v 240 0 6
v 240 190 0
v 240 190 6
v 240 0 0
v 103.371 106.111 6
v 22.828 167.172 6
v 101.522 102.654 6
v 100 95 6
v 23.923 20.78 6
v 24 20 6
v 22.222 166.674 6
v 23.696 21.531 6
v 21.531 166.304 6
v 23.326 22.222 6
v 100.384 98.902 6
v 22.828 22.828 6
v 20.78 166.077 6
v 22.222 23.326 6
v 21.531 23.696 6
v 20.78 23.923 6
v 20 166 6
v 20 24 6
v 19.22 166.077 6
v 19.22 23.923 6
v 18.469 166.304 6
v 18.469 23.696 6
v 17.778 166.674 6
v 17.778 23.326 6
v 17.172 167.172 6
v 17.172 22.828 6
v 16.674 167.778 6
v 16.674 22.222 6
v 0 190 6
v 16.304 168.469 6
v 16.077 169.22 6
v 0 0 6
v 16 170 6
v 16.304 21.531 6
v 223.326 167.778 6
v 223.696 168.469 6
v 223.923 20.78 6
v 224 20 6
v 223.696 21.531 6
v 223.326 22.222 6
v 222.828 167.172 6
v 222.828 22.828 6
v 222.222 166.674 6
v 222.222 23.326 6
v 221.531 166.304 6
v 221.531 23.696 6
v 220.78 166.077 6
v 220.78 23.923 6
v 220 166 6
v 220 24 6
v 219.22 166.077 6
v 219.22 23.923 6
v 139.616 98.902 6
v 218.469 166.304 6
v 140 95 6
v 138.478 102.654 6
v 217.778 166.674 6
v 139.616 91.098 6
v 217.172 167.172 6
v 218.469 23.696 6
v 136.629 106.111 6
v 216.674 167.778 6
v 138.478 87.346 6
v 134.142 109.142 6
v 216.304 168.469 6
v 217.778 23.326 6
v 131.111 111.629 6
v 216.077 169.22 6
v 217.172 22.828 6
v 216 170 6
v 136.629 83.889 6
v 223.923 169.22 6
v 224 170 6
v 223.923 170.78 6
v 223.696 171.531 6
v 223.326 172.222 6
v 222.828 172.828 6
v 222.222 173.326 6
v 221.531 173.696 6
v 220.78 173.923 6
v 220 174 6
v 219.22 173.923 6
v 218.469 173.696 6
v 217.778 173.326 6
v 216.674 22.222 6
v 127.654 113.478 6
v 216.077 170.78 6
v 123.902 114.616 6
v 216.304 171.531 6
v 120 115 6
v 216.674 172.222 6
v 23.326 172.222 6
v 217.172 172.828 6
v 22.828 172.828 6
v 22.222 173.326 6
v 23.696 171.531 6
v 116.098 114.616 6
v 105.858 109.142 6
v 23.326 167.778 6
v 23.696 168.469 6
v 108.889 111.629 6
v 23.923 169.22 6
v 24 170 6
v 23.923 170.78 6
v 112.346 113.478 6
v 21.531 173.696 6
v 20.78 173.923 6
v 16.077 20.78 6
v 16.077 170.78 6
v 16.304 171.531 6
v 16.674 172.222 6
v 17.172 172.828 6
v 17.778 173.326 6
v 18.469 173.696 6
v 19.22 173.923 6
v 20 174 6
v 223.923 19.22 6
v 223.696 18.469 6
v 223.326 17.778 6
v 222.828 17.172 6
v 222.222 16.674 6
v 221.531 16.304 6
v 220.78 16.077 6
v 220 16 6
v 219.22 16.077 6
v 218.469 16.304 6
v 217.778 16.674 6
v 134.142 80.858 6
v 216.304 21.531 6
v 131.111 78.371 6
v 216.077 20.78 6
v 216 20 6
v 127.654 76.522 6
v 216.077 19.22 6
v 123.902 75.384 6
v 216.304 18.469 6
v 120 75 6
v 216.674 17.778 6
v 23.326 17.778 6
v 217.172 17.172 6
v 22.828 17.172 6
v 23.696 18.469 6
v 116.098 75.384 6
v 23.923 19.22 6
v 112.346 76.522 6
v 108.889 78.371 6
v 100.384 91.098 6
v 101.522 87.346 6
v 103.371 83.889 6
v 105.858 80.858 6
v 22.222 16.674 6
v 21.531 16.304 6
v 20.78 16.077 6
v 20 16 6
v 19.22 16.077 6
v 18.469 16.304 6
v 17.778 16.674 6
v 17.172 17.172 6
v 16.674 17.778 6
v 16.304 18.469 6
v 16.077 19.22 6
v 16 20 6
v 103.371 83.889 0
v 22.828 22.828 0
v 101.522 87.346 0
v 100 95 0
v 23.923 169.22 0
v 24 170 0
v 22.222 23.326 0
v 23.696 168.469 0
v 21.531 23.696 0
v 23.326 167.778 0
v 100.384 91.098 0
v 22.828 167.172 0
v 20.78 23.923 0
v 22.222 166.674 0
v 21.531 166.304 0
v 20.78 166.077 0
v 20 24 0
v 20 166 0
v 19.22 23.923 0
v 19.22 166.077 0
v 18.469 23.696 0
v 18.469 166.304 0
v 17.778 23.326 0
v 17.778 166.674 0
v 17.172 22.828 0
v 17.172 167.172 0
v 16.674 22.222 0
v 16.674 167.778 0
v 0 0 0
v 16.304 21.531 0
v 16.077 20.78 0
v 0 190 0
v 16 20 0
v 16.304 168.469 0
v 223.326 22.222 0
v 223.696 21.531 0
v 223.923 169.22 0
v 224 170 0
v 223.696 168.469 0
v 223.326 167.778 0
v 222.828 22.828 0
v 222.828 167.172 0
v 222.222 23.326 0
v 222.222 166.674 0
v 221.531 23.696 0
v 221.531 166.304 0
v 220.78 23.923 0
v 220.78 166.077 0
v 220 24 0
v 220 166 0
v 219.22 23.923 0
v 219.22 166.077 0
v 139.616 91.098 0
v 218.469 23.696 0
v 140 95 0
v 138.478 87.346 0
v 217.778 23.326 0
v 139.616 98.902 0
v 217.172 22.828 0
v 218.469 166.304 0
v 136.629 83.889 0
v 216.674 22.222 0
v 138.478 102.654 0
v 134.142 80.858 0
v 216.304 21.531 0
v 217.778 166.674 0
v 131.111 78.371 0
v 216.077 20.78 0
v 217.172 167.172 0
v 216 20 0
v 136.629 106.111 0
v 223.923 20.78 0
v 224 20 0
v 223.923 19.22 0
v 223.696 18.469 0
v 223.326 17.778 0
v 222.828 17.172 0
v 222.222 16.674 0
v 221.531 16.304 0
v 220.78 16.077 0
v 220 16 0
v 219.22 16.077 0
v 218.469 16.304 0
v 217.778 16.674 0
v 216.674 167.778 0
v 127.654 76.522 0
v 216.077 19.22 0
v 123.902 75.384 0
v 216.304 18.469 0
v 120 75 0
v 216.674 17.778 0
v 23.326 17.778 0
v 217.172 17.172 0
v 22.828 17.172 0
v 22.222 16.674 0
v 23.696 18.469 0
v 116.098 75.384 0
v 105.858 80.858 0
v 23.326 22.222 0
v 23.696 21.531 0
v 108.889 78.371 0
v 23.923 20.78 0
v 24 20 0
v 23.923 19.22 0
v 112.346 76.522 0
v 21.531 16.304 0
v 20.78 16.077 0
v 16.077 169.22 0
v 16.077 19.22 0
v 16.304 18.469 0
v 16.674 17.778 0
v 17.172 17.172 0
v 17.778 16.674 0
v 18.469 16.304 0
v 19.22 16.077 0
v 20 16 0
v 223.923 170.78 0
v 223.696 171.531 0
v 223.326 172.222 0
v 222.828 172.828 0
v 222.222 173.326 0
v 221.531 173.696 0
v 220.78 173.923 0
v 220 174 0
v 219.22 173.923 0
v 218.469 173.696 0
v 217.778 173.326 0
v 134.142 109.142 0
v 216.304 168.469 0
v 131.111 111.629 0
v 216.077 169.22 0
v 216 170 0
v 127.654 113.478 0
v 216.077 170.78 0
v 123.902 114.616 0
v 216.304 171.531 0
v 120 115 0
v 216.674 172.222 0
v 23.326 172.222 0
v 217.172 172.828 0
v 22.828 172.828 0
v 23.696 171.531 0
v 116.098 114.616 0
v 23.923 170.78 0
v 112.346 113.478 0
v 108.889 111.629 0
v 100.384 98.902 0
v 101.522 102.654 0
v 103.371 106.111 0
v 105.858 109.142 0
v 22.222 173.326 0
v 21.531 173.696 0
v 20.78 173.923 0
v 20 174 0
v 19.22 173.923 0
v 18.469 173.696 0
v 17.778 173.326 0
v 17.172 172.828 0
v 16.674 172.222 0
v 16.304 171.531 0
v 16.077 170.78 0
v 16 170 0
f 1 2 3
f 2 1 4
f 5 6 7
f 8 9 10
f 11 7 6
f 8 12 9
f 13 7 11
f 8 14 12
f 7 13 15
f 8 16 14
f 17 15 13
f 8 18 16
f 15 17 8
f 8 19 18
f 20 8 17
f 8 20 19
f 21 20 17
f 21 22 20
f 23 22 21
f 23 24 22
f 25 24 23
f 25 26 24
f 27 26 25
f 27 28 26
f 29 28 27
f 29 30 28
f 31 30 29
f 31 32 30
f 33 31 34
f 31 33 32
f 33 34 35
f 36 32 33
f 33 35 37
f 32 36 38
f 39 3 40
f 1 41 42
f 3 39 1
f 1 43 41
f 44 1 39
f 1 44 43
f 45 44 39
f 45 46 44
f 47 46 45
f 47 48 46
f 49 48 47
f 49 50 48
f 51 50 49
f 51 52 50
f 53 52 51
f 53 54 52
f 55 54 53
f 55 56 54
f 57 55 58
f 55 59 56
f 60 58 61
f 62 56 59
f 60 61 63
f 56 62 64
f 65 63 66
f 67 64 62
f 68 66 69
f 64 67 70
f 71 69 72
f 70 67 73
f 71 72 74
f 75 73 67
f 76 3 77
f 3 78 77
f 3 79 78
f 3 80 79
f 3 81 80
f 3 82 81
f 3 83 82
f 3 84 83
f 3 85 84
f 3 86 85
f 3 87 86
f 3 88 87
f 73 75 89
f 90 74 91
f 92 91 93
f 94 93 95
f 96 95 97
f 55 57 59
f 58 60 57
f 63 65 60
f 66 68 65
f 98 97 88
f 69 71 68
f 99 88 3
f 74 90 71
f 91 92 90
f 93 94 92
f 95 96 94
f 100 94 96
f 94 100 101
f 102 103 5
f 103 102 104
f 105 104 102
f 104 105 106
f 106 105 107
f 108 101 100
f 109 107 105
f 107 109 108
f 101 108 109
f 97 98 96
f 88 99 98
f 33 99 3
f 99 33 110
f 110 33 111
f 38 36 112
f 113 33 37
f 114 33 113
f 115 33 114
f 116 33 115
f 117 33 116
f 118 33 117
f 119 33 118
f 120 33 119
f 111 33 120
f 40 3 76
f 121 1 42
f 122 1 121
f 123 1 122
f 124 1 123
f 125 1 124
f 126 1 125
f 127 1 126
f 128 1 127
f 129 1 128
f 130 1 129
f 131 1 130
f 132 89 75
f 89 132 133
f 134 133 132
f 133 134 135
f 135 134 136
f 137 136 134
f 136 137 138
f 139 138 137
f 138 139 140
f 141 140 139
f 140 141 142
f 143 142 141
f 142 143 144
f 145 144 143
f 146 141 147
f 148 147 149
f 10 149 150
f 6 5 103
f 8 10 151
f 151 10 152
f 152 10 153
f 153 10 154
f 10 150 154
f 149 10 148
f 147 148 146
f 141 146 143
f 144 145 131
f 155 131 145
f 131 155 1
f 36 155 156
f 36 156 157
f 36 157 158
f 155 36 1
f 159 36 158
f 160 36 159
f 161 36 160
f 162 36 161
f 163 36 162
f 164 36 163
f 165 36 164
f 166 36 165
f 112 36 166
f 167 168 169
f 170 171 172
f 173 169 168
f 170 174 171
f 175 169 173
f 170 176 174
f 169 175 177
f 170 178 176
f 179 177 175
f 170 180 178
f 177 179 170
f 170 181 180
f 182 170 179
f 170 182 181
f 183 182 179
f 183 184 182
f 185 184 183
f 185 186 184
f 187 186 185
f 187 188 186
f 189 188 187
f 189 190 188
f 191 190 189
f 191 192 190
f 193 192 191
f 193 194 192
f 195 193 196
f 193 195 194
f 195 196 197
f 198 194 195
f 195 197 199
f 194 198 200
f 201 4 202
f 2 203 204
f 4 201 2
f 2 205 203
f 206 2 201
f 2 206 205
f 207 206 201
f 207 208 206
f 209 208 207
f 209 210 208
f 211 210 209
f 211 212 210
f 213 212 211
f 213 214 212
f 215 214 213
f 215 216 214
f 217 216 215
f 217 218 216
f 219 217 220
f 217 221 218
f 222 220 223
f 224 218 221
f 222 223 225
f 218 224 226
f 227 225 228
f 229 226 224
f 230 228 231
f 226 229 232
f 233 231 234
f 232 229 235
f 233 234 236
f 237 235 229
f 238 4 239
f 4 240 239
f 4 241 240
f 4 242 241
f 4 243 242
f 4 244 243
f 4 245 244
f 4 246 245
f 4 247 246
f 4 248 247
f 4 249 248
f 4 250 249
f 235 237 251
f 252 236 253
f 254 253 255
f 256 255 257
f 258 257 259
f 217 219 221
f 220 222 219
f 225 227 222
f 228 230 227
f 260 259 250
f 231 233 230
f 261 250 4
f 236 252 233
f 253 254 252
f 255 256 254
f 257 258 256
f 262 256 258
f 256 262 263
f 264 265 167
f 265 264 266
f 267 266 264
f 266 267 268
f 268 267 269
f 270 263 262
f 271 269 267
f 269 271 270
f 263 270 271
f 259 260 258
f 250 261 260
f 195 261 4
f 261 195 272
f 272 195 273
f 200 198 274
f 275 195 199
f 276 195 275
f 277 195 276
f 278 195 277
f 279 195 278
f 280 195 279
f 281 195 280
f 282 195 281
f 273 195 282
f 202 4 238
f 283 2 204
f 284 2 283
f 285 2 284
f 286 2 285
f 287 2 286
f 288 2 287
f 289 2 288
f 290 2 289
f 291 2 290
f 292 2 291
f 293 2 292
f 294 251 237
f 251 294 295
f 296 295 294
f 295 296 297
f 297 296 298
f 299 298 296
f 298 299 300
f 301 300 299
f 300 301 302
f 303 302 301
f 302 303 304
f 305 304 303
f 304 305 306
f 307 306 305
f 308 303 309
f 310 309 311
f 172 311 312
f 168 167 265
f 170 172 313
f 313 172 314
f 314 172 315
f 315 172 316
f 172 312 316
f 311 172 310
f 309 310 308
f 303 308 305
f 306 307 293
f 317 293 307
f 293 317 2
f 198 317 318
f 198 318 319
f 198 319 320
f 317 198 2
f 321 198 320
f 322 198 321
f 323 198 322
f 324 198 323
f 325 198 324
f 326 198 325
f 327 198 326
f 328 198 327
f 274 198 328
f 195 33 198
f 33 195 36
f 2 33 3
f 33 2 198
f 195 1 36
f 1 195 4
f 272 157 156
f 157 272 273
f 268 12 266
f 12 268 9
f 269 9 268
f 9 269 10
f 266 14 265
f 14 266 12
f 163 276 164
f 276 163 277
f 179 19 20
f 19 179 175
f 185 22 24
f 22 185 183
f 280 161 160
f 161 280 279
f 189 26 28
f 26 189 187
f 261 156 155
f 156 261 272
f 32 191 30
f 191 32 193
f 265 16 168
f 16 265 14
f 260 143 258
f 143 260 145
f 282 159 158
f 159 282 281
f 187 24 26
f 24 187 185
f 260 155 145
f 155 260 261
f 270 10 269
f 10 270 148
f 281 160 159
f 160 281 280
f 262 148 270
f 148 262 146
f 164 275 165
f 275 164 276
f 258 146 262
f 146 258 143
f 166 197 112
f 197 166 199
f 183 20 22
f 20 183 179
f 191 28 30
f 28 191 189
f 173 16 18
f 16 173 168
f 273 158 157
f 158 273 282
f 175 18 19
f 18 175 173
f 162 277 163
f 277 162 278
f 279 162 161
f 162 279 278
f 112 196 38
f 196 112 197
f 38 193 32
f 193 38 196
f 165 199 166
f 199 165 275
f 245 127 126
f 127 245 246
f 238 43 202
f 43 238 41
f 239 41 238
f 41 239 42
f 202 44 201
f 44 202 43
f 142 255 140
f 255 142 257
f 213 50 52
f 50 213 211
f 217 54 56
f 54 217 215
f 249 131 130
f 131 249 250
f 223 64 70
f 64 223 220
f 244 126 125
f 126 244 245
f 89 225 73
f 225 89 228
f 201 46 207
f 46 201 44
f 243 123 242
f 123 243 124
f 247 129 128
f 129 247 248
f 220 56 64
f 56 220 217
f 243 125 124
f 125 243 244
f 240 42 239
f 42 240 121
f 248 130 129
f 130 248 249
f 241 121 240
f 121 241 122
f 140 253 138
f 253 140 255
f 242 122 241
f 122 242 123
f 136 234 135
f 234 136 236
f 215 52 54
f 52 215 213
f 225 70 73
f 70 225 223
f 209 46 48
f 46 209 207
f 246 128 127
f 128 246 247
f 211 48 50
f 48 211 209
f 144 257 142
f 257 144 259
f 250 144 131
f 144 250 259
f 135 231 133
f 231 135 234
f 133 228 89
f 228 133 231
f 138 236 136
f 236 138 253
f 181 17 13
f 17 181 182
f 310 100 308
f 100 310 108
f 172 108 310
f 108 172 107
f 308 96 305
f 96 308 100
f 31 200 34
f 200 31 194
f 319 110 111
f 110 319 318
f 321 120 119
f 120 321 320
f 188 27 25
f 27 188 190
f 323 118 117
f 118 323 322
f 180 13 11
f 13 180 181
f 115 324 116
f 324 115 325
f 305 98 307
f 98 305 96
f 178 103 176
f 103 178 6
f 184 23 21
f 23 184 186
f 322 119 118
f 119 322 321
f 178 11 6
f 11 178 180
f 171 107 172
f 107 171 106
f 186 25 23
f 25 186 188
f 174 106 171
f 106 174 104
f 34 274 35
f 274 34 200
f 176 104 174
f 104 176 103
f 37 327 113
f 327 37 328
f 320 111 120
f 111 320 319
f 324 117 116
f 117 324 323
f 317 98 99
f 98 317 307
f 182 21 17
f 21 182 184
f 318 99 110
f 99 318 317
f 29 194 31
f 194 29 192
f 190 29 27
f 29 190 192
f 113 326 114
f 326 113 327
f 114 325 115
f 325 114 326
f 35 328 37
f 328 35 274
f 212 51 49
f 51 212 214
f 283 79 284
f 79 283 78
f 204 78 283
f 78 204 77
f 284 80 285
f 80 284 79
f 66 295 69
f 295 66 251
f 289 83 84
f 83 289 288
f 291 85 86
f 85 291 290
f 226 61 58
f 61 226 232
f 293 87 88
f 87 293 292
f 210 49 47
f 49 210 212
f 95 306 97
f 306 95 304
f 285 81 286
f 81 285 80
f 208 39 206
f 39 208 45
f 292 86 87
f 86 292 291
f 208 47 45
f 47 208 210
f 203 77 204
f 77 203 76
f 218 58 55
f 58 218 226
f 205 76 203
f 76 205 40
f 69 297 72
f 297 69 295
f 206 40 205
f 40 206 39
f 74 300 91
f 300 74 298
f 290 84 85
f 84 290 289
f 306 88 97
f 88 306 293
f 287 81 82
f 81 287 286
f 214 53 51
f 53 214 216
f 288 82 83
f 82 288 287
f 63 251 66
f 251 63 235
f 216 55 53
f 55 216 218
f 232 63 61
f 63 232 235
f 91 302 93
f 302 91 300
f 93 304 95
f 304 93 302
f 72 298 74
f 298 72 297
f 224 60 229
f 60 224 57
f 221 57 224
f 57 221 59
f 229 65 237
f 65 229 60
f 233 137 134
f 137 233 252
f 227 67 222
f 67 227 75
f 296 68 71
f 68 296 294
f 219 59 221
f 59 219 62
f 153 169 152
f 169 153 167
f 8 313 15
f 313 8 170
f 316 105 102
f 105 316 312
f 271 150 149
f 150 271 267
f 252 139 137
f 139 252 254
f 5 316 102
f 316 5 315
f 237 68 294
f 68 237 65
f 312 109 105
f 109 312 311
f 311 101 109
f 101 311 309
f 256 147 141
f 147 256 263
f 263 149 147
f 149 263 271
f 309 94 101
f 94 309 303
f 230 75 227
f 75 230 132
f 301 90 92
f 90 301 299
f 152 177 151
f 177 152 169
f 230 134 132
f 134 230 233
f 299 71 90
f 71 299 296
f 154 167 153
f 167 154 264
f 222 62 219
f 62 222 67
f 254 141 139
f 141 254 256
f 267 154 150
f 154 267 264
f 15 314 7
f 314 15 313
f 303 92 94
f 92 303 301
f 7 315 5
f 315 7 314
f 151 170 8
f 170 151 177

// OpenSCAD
$fn = 32;

// ----------------------------------------------------------------------
// Big plate: 200-250 mm adapter plate
// ----------------------------------------------------------------------

// --- parameters (mm) ---
plate_l = 240;            // plate length, X
plate_w = 190;            // plate width, Y
plate_t = 6;              // plate thickness, Z
corner_d = 8;             // corner hole diameter
corner_in = 20;           // corner hole inset from the edges
bore_d = 40;              // central bore

difference() {
  cube([plate_l, plate_w, plate_t]);
  translate([corner_in, corner_in, -1]) cylinder(h = plate_t + 2, d = corner_d);
  translate([plate_l - corner_in, corner_in, -1]) cylinder(h = plate_t + 2, d = corner_d);
  translate([corner_in, plate_w - corner_in, -1]) cylinder(h = plate_t + 2, d = corner_d);
  translate([plate_l - corner_in, plate_w - corner_in, -1]) cylinder(h = plate_t + 2, d = corner_d);
  translate([plate_l / 2, plate_w / 2, -1]) cylinder(h = plate_t + 2, d = bore_d);
}
